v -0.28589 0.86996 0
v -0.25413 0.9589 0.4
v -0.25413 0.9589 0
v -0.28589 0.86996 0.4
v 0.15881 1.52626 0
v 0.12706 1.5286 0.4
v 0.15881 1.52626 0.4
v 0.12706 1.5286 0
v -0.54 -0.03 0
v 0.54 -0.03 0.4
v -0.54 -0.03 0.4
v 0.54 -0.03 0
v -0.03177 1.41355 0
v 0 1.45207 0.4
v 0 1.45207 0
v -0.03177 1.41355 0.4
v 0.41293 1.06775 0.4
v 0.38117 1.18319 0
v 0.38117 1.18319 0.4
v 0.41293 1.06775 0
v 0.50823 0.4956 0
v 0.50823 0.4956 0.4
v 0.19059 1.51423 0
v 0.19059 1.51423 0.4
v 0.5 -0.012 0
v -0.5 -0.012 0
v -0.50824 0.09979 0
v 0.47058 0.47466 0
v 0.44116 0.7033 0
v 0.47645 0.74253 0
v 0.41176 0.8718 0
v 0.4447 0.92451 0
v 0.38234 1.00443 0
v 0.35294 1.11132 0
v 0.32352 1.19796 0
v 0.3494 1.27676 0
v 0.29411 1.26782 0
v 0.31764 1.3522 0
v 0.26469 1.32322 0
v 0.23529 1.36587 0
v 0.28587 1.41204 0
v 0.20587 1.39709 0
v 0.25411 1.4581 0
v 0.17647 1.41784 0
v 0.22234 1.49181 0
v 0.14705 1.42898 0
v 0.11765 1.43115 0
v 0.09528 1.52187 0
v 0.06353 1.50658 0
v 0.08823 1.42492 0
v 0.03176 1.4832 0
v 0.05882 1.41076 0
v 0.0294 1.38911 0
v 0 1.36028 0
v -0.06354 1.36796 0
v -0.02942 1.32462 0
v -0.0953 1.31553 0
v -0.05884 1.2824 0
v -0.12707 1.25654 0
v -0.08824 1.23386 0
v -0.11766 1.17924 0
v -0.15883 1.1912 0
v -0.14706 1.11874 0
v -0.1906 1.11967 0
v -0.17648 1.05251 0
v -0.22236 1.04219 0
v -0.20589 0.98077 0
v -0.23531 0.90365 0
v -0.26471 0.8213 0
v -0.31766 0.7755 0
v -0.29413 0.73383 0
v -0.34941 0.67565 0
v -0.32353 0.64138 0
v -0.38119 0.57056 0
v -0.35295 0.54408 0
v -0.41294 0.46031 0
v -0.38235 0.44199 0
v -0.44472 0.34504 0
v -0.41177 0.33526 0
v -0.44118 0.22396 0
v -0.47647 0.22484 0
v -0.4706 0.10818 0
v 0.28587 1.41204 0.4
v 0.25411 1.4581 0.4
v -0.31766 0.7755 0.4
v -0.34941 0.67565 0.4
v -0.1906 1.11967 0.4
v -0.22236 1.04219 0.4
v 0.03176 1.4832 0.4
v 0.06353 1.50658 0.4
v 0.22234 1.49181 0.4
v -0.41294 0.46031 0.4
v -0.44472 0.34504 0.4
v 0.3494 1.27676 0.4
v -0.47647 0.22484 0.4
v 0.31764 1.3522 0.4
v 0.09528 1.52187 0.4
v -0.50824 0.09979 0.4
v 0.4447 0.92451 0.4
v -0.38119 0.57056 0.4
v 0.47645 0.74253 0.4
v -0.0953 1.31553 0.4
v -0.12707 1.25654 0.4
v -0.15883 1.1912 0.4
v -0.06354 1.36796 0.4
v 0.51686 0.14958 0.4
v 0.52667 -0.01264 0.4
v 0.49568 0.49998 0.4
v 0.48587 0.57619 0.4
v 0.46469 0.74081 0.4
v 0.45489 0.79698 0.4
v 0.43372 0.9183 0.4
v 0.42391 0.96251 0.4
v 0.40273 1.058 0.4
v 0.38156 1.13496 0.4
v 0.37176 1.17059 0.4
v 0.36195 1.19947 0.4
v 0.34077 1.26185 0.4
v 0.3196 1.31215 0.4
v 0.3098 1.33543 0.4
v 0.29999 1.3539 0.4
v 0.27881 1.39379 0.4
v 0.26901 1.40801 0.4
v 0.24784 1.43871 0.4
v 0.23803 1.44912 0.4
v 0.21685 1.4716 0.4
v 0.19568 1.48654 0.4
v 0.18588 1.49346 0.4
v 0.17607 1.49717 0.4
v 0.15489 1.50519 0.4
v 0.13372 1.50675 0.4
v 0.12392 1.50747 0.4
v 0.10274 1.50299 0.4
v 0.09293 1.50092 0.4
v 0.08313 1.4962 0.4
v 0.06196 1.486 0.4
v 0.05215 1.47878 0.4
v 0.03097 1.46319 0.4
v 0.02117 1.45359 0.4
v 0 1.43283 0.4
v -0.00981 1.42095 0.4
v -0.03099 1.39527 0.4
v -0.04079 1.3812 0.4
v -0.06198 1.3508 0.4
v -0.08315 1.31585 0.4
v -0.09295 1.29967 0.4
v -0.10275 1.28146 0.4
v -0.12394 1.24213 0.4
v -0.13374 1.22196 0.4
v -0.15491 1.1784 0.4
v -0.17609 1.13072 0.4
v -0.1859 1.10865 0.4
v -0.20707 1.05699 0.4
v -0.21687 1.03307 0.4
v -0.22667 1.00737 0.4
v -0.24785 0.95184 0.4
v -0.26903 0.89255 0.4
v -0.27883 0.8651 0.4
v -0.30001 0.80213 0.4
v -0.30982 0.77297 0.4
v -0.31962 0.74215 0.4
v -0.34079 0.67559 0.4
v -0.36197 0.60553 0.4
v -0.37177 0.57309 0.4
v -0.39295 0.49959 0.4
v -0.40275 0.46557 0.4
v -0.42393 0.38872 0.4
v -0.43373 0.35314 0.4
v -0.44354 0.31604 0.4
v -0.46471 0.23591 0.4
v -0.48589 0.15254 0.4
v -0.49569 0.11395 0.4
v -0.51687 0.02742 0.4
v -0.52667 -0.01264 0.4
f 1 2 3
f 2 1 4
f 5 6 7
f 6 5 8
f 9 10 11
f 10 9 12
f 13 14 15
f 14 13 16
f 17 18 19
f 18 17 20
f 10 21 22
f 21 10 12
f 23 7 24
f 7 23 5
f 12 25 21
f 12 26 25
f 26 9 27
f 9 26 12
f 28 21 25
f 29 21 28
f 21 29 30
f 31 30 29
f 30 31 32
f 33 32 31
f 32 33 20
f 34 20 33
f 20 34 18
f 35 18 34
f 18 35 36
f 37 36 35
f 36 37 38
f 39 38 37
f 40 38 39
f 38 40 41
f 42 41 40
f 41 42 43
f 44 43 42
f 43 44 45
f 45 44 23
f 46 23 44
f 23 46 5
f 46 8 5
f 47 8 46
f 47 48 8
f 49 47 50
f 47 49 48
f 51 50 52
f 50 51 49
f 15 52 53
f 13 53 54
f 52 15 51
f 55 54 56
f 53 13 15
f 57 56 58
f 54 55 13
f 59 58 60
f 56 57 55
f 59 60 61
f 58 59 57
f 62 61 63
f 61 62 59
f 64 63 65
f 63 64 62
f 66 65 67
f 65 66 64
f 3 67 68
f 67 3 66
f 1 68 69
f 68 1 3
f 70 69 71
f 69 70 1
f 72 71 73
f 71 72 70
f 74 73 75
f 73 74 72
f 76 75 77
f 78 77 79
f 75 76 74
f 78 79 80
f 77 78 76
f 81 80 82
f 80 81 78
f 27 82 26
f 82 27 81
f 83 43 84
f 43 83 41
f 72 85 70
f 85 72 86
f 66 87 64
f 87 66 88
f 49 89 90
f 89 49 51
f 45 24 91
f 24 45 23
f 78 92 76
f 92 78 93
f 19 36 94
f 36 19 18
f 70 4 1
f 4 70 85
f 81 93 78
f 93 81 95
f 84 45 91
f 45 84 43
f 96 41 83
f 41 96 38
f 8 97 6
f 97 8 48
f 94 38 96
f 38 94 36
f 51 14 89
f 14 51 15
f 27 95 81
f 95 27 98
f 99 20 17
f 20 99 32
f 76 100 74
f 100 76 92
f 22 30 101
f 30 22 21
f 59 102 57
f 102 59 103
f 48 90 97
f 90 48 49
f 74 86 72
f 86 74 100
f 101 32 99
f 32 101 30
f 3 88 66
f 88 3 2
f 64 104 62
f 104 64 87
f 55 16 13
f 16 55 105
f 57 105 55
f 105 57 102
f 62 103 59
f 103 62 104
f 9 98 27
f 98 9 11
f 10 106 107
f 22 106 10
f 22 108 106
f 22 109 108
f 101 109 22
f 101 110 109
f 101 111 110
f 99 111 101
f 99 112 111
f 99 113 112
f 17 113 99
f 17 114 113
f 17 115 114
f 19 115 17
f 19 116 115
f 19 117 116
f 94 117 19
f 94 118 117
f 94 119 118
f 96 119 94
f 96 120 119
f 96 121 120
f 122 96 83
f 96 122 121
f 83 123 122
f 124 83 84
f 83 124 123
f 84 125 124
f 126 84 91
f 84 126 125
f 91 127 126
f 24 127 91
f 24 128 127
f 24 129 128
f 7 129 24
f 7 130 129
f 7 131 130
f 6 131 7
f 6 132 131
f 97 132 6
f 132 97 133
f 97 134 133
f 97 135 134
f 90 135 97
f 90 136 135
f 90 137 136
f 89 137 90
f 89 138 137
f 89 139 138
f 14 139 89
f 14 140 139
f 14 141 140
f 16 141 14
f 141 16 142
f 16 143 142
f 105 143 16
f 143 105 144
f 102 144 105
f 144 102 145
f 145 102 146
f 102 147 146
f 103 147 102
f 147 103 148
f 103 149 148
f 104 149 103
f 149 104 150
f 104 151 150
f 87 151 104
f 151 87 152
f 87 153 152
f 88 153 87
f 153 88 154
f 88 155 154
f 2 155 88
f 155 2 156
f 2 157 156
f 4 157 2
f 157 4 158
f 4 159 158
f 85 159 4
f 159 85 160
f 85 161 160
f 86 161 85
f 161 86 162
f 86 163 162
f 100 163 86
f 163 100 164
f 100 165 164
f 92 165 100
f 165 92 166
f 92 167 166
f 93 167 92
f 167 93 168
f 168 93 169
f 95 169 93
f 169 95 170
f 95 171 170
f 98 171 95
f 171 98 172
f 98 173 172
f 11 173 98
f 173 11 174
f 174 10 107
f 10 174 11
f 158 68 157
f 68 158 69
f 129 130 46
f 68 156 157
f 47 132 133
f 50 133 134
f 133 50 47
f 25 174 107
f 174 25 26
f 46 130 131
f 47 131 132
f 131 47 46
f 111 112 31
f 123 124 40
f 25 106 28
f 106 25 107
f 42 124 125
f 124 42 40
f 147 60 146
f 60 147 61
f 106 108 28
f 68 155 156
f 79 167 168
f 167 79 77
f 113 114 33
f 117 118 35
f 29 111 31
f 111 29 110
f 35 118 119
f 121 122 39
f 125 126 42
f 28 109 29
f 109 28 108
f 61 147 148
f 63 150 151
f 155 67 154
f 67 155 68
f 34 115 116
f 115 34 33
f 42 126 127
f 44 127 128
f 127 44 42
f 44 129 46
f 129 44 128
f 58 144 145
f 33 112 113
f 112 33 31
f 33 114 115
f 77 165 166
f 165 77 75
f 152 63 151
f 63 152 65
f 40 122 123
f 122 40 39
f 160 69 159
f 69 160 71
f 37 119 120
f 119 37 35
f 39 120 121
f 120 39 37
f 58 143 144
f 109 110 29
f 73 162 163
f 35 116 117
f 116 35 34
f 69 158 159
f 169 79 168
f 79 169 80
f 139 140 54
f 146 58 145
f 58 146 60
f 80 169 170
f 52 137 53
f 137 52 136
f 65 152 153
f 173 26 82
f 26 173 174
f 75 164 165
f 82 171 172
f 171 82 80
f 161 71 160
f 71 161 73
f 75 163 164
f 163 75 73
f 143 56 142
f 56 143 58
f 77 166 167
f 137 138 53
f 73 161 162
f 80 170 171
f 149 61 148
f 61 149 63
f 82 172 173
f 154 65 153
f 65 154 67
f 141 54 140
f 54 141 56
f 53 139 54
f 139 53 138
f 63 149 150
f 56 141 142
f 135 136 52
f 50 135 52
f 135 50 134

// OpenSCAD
points = [
	[0.0, 0.0],
	[0.029411764705882353, 0.12018089316227756],
	[0.058823529411764705, 0.2359647043753647],
	[0.08823529411764705, 0.3472684546034517],
	[0.11764705882352941, 0.45400413411798274],
	[0.14705882352941177, 0.556078195803149],
	[0.1764705882352941, 0.6533909766316055],
	[0.20588235294117646, 0.7458360340353749],
	[0.23529411764705882, 0.8332993808366767],
	[0.2647058823529412, 0.915658598487987],
	[0.29411764705882354, 0.9927818033161192],
	[0.3235294117647059, 1.0645264338769969],
	[0.3529411764705882, 1.1307378188514692],
	[0.38235294117647056, 1.1912474733574143],
	[0.4117647058823529, 1.245871055976488],
	[0.4411764705882353, 1.2944058975163855],
	[0.47058823529411764, 1.336627983043052],
	[0.5, 1.37228822720381],
	[0.5294117647058824, 1.4011078233891652],
	[0.5588235294117647, 1.4227723604191558],
	[0.5882352941176471, 1.4369242708217176],
	[0.6176470588235294, 1.4431529766361961],
	[0.6470588235294118, 1.4409817874616988],
	[0.6764705882352942, 1.4298501012769098],
	[0.7058823529411764, 1.4090886121405333],
	[0.7352941176470588, 1.377883747957598],
	[0.7647058823529411, 1.3352248410278518],
	[0.7941176470588235, 1.2798222362083098],
	[0.8235294117647058, 1.2099734613497852],
	[0.8529411764705882, 1.1233292406309068],
	[0.8823529411764706, 1.0164460040750365],
	[0.9117647058823529, 0.8838152888636676],
	[0.9411764705882353, 0.715311223066938],
	[0.9705882352941176, 0.4866772027741895],
	[1.0, 0.0],
];
difference(){
    
// OUTER COOKIE CUTTER SHAPE
    
    // extrude the outer polygon into a 3D shape
    // this extrusion is thinner than the inner shape to make sure the inner shape "cuts" through it completely
    linear_extrude(0.4)
    
        // x- and y-shift the outer polygon to be roughly centered around the inner shape
        // z-shift the outer polygon so the extruded inner shape cuts all the way through
        translate([-0.54, -0.03, -0.1])
            
            // scale this polygon up a bit to make an outer ring of a cookie cutter
            scale(1.08, 1.08, 1.08)
            
                // generate a polygon to become the outer shape
                polygon(points);        
    
// INNER COOKIE CUTTER SHAPE TO BE SUBTRACTED FROM OUTER

    // extrude the inner polygon into a 3D shape
    // this extrusion is thicker than the outer shape to ensure the inner shape "cuts" completey through the outer
    linear_extrude(0.6, scale=1.08) 
    
        // x-shift the shape to 
        translate([-0.5, -0.012, 0]) //x-center the polygon at origin
            
            // generate a polygon to become the inner shape (this is effectively defining a hole)
            polygon(points);
}
